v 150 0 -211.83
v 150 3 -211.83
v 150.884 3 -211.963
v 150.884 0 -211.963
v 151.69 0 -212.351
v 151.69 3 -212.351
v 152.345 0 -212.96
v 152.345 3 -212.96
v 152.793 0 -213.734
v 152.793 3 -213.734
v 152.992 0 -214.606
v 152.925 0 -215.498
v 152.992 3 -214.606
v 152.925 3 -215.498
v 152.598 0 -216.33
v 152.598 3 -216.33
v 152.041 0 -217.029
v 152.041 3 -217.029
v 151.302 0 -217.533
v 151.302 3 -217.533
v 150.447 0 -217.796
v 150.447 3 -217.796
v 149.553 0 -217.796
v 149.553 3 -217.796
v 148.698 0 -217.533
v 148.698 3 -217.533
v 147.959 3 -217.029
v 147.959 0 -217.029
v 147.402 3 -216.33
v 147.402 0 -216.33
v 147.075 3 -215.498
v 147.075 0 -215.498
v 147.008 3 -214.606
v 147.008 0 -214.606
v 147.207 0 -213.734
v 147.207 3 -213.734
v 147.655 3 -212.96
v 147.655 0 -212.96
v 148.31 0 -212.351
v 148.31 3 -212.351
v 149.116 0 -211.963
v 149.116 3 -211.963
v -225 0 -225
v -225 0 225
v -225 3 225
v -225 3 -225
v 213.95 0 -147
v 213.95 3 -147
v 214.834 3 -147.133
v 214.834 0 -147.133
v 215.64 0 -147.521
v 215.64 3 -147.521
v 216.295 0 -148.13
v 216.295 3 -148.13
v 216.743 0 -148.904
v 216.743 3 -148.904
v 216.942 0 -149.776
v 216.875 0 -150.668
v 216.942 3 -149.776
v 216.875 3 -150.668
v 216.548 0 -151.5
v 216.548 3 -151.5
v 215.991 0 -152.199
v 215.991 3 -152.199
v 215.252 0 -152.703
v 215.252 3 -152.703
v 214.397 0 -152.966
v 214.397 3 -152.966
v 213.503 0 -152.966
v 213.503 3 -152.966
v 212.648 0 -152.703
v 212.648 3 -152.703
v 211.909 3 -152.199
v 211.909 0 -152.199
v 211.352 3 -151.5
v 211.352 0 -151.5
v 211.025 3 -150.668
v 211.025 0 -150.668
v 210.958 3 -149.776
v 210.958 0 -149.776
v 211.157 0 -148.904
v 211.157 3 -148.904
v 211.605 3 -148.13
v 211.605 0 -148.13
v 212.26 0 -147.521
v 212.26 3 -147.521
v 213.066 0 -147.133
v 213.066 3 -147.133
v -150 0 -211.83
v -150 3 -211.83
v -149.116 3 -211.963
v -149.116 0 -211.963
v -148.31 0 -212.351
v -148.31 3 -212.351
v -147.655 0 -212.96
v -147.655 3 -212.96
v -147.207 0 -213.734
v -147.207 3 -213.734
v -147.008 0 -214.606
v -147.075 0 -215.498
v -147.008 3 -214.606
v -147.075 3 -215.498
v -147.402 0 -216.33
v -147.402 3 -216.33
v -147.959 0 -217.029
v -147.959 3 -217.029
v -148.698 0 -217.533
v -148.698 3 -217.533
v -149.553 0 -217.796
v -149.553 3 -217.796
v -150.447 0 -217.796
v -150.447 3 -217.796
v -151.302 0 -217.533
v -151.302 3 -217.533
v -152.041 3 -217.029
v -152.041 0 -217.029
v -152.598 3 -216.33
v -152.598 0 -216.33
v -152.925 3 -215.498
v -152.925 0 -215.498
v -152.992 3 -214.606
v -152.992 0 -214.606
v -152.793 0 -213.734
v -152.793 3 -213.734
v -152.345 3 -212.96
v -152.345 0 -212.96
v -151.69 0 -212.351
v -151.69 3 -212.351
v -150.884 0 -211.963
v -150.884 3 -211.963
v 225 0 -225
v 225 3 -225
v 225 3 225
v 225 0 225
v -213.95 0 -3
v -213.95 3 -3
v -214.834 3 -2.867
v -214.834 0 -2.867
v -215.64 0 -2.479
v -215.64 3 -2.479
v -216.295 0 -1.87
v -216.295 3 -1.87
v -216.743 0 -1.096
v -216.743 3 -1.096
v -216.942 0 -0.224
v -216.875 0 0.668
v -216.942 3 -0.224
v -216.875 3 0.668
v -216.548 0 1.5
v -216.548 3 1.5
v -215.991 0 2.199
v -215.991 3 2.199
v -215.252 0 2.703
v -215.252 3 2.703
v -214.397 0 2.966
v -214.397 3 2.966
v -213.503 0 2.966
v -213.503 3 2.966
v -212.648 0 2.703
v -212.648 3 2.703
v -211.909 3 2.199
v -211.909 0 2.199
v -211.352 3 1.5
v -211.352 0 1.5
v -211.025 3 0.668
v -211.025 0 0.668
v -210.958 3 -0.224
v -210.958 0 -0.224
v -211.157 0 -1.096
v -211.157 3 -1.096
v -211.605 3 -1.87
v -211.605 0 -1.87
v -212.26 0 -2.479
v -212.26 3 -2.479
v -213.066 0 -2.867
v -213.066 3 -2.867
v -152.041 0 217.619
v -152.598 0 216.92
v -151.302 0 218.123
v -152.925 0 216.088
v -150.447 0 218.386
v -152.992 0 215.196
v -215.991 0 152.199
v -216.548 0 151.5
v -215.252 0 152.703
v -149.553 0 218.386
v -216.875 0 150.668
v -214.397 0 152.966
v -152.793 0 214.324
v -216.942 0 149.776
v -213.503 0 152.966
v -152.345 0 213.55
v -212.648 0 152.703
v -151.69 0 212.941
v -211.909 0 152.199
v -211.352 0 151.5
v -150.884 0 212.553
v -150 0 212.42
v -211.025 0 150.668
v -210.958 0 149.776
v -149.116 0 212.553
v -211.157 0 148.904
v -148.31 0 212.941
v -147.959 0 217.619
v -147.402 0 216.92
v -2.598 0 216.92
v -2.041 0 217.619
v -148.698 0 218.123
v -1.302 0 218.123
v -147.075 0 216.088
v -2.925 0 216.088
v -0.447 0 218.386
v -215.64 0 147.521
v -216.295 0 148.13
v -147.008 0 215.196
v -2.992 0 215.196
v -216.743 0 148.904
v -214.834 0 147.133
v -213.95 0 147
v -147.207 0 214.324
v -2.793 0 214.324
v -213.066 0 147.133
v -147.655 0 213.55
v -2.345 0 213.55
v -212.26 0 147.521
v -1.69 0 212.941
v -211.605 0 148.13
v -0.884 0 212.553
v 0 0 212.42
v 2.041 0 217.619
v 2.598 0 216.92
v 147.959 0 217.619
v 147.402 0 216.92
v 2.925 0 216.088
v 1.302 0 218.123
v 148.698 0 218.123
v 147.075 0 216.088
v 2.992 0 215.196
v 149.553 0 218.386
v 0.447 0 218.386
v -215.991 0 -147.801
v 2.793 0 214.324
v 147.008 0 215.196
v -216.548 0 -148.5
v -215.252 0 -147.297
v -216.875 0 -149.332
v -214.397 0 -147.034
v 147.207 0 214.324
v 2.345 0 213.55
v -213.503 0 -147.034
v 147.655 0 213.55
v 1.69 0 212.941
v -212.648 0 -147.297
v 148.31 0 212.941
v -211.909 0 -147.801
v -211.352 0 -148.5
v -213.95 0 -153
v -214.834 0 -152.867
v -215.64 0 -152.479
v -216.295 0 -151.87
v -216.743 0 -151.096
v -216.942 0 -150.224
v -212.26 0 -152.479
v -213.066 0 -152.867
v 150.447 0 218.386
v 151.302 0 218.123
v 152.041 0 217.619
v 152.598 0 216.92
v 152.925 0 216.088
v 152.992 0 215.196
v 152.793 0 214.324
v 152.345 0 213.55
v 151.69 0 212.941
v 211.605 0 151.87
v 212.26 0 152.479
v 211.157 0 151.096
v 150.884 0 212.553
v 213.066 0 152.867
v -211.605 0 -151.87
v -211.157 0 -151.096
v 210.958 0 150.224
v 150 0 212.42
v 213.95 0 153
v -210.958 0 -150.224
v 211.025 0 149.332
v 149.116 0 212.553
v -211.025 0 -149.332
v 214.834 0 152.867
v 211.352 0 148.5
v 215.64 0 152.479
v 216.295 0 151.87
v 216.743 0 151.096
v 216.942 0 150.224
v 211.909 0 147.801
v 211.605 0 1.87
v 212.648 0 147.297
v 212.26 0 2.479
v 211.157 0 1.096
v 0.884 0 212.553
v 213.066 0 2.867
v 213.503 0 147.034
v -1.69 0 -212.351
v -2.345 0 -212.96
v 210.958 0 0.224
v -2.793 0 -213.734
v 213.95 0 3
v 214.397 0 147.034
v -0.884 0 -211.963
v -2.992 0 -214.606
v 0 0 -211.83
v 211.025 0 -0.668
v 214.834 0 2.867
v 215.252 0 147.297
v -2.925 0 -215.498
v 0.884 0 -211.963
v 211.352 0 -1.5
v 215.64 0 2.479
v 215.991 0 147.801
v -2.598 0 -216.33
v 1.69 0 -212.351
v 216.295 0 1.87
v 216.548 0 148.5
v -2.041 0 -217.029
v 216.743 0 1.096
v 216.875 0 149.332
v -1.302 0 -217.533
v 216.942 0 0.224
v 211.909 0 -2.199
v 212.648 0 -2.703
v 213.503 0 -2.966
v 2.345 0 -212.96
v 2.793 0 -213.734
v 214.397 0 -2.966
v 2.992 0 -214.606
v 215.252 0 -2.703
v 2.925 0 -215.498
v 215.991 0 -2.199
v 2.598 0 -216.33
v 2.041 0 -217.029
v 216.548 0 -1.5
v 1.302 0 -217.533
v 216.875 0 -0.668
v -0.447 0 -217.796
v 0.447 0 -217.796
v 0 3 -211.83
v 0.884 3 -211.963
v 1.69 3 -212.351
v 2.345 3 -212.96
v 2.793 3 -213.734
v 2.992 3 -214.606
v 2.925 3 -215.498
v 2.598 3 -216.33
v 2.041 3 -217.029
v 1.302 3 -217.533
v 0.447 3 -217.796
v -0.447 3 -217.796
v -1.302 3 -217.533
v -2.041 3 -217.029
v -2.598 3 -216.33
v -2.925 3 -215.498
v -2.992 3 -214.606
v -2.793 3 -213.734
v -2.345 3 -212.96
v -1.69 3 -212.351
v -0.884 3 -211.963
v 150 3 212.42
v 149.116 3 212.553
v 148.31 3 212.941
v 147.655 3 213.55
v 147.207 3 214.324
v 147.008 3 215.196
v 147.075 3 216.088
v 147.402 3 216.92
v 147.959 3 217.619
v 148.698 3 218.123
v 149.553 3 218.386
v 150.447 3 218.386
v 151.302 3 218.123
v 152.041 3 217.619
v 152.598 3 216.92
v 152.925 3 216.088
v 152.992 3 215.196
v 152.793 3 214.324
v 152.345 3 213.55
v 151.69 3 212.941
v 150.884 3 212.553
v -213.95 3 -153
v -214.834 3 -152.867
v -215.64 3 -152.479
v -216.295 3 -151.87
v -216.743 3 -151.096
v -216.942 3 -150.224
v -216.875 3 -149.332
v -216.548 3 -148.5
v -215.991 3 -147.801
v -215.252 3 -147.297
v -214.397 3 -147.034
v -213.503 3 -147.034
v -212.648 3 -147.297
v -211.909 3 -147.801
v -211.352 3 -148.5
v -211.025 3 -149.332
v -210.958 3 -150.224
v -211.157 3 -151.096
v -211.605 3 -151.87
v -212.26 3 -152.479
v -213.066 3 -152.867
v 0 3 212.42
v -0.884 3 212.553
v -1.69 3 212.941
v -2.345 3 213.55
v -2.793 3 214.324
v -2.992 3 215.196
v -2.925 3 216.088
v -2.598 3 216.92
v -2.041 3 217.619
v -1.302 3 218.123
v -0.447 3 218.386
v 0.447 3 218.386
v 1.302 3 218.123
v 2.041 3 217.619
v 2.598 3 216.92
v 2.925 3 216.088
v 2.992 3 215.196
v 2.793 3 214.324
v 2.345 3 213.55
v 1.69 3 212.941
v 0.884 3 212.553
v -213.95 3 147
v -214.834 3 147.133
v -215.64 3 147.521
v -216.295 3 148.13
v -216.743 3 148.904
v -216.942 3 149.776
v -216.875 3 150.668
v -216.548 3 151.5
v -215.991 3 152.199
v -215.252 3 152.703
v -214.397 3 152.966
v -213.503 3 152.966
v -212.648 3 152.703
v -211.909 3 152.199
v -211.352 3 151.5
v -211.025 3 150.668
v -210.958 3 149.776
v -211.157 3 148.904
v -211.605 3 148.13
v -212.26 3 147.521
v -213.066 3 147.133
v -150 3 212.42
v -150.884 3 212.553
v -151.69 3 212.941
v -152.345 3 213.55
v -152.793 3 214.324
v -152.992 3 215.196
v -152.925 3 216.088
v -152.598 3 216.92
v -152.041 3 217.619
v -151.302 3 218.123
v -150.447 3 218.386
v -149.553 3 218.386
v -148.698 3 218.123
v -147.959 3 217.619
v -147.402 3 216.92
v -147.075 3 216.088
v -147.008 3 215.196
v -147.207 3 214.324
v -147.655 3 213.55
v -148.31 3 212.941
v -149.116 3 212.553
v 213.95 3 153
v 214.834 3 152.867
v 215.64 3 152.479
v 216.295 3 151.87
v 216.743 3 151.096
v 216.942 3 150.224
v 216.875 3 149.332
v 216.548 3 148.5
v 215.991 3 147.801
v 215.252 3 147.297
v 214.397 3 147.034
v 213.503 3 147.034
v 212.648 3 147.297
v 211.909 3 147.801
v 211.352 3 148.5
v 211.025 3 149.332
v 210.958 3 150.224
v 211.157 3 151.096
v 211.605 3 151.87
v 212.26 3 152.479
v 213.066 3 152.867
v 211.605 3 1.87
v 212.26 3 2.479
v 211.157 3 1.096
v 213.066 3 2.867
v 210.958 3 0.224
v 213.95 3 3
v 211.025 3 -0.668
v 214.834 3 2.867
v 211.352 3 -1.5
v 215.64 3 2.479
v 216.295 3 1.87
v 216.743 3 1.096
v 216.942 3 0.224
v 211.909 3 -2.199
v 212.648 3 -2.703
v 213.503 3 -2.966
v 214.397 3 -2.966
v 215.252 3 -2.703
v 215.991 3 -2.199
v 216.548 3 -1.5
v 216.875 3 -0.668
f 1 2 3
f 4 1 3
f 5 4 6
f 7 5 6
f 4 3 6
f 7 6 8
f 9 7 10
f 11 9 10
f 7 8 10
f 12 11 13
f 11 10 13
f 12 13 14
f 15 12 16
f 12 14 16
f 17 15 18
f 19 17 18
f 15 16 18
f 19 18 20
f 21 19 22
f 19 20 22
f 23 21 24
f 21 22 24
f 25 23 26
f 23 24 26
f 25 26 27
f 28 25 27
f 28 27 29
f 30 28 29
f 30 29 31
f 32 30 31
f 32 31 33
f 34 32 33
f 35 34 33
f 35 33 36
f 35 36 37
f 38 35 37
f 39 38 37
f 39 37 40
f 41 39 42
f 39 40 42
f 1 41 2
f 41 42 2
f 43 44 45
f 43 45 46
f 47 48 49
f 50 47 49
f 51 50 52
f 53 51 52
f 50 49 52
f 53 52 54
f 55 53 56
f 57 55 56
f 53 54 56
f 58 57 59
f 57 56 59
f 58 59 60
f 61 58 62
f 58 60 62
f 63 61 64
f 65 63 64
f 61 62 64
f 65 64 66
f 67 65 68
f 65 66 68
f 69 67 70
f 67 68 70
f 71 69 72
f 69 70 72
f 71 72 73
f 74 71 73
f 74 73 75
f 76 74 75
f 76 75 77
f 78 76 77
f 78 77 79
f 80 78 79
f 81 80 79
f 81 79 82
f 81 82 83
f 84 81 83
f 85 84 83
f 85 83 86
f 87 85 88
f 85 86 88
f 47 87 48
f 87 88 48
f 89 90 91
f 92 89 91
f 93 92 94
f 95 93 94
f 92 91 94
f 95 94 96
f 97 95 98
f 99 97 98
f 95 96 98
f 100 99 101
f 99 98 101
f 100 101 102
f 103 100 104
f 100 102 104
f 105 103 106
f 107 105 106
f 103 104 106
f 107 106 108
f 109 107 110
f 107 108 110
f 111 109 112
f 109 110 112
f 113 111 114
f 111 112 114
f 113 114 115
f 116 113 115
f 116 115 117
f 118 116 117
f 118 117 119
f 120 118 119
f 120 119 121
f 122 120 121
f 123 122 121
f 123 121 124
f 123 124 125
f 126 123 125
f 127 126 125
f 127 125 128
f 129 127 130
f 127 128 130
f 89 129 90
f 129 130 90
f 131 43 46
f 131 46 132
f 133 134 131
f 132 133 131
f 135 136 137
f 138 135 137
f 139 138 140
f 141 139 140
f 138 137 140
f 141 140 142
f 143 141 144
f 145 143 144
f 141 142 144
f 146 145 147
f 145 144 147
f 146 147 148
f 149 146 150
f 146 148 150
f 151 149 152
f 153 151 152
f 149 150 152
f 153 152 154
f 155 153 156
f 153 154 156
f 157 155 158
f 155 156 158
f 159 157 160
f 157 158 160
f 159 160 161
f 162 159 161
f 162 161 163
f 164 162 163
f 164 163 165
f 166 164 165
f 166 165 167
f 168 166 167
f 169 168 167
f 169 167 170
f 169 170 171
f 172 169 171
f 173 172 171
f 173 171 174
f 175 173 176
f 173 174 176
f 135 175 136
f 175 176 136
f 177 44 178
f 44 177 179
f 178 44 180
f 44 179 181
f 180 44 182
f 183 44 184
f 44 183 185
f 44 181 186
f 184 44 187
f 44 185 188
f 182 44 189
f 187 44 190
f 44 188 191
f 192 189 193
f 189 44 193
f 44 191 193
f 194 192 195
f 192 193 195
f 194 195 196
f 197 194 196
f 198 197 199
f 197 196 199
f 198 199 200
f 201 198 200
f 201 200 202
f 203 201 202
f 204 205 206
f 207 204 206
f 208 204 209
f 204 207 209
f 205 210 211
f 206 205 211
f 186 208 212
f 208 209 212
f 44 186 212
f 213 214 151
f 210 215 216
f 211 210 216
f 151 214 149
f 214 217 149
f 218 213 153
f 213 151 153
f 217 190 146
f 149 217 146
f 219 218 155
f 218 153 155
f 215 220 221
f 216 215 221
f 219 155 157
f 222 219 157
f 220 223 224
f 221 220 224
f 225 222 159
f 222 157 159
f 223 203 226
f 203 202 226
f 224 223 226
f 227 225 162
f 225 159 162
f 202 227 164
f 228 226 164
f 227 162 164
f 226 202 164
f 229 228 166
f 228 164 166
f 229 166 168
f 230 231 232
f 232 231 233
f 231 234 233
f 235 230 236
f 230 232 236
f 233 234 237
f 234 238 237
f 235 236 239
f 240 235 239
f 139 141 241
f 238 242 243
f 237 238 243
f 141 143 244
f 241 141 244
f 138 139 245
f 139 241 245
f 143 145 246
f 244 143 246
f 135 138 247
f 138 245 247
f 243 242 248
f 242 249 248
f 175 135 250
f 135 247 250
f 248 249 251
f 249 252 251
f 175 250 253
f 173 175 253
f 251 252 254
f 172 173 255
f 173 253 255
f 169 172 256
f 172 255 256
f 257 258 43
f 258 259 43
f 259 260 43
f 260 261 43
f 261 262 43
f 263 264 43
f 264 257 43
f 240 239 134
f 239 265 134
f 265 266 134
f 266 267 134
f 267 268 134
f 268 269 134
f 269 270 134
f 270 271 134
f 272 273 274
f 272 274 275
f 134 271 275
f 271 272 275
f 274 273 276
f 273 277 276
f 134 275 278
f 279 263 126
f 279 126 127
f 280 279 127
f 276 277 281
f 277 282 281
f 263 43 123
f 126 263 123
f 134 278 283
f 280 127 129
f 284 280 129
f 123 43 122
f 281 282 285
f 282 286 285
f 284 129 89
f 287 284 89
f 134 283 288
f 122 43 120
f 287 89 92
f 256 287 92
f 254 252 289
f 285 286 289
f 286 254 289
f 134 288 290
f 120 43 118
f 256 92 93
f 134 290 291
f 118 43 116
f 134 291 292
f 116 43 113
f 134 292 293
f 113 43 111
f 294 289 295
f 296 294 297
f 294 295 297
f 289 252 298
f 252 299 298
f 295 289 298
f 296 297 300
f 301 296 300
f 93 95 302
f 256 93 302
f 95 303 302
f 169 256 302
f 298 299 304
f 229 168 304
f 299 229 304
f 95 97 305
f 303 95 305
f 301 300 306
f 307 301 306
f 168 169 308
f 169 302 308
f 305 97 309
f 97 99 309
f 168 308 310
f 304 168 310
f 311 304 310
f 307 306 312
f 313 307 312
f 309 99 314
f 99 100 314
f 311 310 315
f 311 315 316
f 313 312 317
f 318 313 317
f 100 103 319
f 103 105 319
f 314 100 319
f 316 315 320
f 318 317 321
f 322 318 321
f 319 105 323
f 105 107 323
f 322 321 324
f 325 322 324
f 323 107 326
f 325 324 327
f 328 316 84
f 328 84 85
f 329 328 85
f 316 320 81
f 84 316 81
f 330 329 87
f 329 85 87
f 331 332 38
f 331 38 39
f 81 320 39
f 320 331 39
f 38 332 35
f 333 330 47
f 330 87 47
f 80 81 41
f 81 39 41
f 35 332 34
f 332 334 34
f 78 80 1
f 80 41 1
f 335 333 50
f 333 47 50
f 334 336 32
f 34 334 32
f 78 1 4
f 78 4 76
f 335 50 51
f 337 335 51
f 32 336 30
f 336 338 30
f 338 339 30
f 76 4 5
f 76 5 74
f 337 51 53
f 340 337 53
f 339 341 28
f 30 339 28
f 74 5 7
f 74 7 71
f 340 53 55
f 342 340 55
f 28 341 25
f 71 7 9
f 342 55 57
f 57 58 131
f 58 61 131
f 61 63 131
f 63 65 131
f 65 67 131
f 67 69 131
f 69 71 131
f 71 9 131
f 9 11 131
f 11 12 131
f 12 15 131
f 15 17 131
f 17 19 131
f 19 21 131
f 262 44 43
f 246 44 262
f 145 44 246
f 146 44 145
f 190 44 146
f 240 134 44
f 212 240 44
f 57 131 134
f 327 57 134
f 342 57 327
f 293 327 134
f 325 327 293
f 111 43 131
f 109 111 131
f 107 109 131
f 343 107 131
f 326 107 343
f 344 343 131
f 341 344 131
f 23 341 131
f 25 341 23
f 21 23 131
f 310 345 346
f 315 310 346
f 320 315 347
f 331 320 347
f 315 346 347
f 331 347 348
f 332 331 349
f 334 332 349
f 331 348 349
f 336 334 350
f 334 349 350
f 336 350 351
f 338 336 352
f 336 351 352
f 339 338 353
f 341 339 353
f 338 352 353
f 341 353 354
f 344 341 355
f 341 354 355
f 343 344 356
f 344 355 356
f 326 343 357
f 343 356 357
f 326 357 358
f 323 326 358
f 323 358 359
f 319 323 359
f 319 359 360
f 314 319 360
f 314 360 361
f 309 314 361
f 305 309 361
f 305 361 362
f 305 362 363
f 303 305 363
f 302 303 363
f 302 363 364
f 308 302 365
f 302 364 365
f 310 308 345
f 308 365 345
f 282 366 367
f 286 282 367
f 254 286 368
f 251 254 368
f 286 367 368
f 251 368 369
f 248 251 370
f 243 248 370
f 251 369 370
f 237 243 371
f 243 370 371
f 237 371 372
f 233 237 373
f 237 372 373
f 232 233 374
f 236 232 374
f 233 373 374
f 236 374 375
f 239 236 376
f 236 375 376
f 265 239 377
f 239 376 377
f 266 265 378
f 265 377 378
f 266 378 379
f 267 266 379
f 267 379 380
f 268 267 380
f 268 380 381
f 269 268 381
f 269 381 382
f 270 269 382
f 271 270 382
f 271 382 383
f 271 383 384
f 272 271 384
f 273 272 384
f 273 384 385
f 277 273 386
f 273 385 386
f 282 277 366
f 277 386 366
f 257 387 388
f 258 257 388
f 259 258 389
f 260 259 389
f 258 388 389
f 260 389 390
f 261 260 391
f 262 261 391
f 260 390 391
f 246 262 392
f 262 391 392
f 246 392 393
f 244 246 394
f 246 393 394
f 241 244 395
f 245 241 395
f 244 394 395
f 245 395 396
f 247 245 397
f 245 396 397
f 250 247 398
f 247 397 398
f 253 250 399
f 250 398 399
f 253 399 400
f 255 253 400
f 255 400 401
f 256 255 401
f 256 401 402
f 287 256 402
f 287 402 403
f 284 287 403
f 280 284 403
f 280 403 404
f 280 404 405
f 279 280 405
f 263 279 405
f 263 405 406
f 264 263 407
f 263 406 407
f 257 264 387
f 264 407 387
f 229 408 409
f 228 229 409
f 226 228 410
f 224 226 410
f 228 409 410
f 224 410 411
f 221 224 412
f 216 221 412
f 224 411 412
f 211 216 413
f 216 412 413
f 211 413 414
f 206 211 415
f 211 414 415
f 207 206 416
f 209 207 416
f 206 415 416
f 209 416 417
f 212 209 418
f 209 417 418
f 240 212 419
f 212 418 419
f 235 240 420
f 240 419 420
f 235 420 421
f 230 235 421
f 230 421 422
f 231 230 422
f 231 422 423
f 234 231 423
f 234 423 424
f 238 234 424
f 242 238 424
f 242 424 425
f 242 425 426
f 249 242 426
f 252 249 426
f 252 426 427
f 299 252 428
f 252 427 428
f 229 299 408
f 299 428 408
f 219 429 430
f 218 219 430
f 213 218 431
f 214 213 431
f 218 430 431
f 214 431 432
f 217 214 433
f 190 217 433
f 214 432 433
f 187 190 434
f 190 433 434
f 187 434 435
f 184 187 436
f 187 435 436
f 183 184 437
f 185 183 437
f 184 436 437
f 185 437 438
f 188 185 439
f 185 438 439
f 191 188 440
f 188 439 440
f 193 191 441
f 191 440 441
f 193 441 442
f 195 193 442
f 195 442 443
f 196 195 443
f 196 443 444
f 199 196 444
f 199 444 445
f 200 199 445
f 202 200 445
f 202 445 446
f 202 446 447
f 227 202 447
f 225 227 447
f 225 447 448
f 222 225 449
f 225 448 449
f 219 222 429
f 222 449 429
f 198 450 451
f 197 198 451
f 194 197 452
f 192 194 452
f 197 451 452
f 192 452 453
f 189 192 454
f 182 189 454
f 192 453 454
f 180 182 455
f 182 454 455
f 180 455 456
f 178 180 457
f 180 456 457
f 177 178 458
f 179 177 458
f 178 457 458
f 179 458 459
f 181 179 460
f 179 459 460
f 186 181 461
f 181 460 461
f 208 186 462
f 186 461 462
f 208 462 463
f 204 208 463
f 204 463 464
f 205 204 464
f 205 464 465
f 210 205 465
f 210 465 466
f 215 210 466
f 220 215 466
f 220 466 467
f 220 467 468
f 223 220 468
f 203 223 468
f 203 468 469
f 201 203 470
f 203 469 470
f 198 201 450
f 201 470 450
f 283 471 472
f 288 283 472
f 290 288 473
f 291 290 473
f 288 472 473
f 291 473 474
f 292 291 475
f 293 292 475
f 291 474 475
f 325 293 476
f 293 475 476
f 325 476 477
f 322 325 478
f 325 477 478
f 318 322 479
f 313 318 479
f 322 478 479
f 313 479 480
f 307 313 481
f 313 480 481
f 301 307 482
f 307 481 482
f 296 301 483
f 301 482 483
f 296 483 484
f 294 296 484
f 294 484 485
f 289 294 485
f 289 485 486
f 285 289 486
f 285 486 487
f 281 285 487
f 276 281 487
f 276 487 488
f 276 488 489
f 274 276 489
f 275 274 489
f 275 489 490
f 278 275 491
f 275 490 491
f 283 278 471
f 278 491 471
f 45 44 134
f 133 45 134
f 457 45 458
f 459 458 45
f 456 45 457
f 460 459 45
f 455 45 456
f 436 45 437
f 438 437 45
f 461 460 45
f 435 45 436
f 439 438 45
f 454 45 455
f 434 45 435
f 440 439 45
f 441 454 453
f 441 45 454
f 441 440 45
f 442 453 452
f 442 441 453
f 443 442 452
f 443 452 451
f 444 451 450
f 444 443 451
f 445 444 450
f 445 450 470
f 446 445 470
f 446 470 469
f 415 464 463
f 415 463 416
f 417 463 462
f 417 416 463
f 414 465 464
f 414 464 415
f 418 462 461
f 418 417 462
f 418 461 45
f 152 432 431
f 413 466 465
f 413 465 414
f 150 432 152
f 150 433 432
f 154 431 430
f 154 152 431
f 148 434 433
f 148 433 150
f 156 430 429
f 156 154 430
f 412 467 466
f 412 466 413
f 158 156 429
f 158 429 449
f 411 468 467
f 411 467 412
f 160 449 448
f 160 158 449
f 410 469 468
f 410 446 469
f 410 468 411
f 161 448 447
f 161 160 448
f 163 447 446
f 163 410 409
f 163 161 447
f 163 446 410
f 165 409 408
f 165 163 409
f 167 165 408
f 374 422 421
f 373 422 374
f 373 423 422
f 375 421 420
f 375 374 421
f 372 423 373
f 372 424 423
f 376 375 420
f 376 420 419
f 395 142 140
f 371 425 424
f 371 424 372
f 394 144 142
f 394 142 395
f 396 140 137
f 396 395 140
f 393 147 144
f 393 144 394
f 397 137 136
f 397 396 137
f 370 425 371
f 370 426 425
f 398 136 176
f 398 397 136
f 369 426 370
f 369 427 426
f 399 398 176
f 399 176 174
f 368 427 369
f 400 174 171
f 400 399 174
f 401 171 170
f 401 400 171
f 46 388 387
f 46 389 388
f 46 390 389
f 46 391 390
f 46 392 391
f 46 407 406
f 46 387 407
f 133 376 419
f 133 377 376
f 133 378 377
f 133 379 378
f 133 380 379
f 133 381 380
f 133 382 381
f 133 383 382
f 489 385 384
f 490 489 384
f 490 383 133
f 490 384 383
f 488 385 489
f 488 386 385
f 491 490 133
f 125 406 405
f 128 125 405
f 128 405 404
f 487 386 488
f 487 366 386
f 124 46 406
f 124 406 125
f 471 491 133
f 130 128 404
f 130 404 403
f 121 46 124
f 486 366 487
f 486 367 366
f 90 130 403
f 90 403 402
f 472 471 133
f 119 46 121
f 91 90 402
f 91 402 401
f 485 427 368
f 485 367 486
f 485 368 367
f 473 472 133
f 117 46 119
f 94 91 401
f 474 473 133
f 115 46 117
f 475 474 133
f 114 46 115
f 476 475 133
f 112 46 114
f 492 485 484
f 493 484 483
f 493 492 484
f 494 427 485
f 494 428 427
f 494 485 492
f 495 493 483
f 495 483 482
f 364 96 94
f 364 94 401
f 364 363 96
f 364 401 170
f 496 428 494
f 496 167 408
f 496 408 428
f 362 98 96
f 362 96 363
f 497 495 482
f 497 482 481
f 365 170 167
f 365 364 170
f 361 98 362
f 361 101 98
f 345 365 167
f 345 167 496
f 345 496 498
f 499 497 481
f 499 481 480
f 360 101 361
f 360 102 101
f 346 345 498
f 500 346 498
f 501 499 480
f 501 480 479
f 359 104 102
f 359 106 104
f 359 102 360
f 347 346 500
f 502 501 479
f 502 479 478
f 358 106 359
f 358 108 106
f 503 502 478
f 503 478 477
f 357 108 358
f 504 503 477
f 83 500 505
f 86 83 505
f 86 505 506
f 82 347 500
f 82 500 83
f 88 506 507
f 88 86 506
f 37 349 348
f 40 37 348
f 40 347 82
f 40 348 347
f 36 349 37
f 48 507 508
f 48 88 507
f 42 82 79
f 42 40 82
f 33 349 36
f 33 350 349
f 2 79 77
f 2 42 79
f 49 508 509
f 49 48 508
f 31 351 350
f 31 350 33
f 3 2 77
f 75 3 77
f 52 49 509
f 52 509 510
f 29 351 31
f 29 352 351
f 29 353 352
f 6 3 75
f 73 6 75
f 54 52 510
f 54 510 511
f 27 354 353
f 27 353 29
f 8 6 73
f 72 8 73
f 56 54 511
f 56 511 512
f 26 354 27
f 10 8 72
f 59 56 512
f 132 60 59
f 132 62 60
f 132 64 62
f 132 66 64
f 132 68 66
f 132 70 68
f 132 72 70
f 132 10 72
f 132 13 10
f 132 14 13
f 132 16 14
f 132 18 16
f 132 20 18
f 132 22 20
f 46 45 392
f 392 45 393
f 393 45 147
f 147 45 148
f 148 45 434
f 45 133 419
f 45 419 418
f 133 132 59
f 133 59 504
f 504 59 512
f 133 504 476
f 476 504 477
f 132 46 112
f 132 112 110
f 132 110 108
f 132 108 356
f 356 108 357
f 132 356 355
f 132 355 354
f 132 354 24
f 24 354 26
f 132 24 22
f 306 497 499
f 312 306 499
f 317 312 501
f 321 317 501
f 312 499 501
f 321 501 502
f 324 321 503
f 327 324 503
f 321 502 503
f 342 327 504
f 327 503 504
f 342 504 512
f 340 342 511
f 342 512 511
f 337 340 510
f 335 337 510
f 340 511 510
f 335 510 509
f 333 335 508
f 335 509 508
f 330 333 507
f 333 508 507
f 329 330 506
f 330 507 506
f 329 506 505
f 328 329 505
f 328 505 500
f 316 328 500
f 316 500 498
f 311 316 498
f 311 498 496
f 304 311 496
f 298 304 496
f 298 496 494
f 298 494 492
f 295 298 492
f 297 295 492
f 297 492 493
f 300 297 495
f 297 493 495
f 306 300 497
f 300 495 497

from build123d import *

# Parameters (mm, degrees)
SKETCH1_W           = 450
SKETCH1_H           = 450
BOSS_EXTRUDE1_DEPTH = 3
SKETCH6_R           = 3
CUT_EXTRUDE1_DEPTH  = 3


with BuildPart() as part:
    # Sketch1 → Boss-Extrude1 (new body)
    with BuildSketch(Plane(origin=(0, 0, 0), x_dir=(1, 0, 0), z_dir=(0, 1, 0))):
        Rectangle(SKETCH1_W, SKETCH1_H)
    extrude(amount=BOSS_EXTRUDE1_DEPTH)

    # Sketch6 → Cut-Extrude1 (cut)
    with BuildSketch(Plane(origin=(0, 3, 0), x_dir=(1, 0, 0), z_dir=(0, 1, 0))):
        with Locations(Location((-150, 214.83, 0), (0, 0, 270))):
            Circle(SKETCH6_R)
        with Locations(Location((0, 214.83, 0), (0, 0, 270))):
            Circle(SKETCH6_R)
        with Locations(Location((150, 214.83, 0), (0, 0, 270))):
            Circle(SKETCH6_R)
        with Locations(Location((150, -215.42, 0), (0, 0, 90))):
            Circle(SKETCH6_R)
        with Locations(Location((0, -215.420006429, 0), (0, 0, 90))):
            Circle(SKETCH6_R)
        with Locations(Location((-150, -215.420006429, 0), (0, 0, 90))):
            Circle(SKETCH6_R)
        with Locations(Location((213.95, 150, 0), (0, 0, 270))):
            Circle(SKETCH6_R)
        with Locations(Location((213.949999998, 0, 0), (0, 0, 270))):
            Circle(SKETCH6_R)
        with Locations(Location((213.949999998, -150, 0), (0, 0, 270))):
            Circle(SKETCH6_R)
        with Locations(Location((-213.949999802, -150, 0), (0, 0, 90))):
            Circle(SKETCH6_R)
        with Locations(Location((-213.949999604, 0, 0), (0, 0, 90))):
            Circle(SKETCH6_R)
        with Locations(Location((-213.95, 150, 0), (0, 0, 90))):
            Circle(SKETCH6_R)
    extrude(amount=-CUT_EXTRUDE1_DEPTH, mode=Mode.SUBTRACT)


solid = part.part
